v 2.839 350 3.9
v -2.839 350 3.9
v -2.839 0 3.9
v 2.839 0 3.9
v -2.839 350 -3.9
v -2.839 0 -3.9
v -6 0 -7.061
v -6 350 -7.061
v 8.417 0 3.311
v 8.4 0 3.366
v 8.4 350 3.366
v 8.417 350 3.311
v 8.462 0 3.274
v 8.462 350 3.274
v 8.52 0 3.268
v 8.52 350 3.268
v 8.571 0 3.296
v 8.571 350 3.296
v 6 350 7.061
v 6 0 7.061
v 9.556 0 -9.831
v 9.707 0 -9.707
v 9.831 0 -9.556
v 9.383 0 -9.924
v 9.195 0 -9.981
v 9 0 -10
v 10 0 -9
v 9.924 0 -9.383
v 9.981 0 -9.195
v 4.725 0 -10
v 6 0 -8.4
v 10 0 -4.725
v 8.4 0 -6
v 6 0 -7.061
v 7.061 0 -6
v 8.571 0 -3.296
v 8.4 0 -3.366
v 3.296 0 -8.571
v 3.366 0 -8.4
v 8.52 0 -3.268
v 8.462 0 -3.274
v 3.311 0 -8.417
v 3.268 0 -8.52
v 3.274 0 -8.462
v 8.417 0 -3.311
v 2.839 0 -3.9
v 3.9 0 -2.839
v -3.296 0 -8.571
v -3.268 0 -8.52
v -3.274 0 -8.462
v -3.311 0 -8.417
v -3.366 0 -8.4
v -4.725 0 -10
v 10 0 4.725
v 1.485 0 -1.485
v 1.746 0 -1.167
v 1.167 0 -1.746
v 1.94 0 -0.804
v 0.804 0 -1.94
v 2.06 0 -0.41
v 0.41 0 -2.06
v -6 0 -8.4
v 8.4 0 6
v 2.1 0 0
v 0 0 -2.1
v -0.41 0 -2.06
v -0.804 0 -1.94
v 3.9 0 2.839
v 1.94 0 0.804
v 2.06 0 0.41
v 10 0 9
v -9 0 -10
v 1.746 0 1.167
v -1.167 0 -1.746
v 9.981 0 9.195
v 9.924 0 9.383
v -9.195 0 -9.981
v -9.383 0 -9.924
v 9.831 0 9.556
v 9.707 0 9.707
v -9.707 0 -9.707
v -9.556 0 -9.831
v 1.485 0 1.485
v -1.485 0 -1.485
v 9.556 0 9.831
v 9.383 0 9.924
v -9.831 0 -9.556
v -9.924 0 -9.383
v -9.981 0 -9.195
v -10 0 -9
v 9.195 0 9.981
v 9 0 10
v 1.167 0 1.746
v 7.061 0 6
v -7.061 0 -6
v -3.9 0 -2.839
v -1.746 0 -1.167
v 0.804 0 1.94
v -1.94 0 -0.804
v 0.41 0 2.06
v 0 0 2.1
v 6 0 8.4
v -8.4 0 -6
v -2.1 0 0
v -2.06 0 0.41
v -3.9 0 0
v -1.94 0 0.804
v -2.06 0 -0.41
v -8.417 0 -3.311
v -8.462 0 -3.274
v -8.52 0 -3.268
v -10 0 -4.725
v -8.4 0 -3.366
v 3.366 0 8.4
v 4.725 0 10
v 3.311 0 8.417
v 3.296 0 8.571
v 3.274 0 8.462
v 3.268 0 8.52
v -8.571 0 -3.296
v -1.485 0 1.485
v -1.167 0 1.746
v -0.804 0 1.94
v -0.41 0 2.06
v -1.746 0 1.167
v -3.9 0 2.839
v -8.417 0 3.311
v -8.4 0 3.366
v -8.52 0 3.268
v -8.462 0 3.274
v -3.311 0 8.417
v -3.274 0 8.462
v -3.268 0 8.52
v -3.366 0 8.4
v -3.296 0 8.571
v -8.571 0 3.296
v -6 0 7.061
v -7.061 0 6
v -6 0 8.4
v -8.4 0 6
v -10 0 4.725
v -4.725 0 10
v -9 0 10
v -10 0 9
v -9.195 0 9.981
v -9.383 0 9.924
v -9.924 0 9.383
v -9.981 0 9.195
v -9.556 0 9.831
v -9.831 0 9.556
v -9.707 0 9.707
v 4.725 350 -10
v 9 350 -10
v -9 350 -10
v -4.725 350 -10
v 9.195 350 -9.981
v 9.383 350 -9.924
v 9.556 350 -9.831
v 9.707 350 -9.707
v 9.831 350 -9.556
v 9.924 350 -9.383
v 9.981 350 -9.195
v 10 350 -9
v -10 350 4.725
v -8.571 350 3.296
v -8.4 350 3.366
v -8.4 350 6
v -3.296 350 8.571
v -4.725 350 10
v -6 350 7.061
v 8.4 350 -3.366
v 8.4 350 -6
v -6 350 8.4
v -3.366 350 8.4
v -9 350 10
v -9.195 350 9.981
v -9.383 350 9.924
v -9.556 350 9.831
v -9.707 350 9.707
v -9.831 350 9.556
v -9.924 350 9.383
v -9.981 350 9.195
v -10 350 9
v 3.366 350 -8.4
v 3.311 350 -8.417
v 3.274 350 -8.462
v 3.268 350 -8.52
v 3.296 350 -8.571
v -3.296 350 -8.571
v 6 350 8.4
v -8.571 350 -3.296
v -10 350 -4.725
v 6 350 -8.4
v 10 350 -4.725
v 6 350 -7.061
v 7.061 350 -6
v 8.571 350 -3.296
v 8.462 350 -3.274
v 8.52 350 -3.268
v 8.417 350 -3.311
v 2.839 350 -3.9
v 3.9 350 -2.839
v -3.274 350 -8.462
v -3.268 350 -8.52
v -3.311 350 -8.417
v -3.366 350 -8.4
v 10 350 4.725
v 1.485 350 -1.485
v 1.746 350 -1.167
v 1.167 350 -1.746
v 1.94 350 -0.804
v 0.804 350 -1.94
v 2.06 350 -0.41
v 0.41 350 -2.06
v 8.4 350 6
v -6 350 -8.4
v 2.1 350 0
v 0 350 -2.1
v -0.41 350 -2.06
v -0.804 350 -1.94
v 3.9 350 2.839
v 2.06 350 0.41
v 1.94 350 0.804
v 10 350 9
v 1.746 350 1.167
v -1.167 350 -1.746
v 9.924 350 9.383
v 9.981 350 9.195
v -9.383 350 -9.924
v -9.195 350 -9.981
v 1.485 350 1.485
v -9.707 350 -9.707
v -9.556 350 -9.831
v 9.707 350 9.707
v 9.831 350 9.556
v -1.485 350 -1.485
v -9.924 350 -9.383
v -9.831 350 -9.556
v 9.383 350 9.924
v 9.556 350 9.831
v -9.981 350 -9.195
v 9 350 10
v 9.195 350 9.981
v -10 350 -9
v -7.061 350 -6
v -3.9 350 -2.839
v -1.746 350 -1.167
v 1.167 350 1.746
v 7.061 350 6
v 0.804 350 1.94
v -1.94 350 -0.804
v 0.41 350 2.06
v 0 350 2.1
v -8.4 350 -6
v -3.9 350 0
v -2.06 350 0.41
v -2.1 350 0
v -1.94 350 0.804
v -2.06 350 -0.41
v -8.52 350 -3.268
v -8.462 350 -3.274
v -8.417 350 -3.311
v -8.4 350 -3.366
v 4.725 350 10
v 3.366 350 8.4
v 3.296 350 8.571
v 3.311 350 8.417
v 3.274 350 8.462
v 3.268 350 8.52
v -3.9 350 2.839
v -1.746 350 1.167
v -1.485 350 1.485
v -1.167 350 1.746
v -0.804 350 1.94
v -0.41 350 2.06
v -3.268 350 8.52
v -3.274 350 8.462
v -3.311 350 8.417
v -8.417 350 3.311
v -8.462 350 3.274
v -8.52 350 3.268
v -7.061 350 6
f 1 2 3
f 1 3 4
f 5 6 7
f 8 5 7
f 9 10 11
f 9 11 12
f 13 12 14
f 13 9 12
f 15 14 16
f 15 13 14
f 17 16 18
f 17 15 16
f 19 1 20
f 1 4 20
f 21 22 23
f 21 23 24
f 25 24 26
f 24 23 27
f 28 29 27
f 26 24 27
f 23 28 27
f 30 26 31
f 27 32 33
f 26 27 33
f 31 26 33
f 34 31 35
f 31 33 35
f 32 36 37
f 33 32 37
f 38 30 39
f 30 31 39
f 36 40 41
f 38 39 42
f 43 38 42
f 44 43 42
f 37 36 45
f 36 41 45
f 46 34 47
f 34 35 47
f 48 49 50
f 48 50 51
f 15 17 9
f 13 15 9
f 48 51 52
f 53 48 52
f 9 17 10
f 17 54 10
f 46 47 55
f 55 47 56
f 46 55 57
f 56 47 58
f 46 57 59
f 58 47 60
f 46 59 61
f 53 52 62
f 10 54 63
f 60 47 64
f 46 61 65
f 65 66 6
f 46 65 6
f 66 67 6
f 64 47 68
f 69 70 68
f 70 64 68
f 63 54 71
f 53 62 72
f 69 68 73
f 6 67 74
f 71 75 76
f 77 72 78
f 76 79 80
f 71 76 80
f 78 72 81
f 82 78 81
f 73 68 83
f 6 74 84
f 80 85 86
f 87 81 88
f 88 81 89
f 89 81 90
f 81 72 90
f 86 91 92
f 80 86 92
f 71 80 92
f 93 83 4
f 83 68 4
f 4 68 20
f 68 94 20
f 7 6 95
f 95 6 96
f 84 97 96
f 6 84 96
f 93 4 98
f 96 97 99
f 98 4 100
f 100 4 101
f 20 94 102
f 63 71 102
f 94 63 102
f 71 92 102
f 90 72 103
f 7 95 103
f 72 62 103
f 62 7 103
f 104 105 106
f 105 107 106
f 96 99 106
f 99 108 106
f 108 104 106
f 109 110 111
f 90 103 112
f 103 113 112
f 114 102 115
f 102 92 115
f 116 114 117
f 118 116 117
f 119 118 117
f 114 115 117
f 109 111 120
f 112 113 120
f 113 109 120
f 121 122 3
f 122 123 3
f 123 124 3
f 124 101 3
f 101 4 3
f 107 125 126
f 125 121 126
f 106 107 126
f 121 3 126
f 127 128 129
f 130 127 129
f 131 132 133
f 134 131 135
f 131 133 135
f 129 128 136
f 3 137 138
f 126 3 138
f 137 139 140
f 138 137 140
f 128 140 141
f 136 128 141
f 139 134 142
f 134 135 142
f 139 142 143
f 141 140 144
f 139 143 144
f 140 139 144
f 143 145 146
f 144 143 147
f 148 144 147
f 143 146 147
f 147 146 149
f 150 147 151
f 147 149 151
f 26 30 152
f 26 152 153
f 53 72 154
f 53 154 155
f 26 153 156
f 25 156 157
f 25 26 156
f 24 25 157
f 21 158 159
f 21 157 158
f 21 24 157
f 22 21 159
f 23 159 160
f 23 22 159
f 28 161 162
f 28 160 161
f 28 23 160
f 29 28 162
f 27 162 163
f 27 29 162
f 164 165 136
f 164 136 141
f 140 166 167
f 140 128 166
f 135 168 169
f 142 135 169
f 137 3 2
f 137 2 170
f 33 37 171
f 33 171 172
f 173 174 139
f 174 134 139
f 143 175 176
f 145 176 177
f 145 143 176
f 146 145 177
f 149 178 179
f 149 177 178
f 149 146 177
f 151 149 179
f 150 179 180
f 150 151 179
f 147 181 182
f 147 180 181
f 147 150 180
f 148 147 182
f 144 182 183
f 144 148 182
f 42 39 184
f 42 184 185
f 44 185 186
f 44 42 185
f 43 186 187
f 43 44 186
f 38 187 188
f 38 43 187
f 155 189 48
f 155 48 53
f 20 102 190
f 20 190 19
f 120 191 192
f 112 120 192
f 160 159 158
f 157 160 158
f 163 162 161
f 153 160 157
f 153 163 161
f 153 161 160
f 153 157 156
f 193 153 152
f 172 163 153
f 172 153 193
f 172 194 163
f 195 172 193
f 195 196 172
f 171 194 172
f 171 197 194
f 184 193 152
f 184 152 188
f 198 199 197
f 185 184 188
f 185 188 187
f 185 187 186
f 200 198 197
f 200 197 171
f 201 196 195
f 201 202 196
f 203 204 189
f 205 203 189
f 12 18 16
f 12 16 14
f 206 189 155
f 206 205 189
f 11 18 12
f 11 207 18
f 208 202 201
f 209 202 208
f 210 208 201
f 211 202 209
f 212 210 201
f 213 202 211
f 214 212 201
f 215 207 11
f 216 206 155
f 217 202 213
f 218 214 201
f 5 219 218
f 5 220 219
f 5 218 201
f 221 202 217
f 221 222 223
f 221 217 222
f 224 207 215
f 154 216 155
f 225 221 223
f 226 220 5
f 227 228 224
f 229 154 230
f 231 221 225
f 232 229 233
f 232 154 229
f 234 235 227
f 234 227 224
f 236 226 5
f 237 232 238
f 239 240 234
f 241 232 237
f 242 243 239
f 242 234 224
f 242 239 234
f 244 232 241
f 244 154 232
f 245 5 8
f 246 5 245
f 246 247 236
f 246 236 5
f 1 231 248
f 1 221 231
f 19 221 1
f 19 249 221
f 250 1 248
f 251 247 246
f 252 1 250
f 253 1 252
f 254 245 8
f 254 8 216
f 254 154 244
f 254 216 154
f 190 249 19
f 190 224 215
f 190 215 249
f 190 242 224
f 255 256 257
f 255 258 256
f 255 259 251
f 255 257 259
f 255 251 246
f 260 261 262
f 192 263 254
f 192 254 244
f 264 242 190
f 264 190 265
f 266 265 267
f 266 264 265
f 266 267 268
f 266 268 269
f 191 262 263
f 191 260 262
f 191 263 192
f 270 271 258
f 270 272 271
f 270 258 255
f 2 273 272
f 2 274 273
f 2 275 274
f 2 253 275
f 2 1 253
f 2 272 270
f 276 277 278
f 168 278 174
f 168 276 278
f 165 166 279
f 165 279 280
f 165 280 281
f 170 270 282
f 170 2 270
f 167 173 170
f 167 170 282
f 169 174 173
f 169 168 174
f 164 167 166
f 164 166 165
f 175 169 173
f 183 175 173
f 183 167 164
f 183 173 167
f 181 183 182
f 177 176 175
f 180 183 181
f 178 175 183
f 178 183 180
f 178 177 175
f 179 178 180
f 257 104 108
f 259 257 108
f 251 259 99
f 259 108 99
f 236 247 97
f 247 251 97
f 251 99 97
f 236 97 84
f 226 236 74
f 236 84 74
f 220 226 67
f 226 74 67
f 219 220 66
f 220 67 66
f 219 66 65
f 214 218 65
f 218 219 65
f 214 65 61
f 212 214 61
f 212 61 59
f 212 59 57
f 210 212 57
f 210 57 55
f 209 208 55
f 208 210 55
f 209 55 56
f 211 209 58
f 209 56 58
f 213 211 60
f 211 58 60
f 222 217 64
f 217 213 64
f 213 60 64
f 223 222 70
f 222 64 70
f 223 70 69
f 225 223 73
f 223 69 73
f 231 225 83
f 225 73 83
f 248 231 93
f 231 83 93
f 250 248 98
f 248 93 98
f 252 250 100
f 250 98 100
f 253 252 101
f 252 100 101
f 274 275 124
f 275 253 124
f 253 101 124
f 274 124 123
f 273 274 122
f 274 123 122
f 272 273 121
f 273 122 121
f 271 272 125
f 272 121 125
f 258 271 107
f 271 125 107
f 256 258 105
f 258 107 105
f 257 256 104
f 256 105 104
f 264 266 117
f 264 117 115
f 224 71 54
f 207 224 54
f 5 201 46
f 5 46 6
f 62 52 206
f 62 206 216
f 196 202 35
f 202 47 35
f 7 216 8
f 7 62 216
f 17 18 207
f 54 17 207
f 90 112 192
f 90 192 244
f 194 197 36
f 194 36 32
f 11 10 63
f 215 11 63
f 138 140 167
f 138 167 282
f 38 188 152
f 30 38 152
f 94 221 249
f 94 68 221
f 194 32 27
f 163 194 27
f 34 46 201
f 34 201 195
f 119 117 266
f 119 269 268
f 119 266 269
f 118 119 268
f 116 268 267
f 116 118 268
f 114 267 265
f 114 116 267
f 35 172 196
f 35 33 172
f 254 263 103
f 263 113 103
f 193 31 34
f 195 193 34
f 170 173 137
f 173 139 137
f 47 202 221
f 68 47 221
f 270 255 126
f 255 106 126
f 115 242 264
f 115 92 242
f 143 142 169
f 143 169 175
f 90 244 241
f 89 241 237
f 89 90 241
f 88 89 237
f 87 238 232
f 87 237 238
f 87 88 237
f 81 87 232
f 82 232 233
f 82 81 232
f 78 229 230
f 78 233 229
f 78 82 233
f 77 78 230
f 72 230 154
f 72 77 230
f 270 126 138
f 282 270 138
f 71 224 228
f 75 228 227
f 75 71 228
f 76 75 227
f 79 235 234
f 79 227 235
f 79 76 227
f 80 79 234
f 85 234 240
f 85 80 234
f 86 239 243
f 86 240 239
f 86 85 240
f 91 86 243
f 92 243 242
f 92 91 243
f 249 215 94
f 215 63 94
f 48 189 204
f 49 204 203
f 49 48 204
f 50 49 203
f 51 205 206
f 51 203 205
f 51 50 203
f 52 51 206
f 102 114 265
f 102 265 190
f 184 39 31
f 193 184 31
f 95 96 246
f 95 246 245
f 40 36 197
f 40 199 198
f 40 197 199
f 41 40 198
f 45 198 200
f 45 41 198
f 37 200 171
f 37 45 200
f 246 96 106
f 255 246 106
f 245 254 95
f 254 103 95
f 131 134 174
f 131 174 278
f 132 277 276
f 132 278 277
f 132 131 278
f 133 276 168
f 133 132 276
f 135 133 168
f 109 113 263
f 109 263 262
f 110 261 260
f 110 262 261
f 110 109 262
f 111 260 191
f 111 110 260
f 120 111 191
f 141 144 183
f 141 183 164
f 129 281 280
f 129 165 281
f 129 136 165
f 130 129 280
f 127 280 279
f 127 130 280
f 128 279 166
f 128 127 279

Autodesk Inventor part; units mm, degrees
ref_plane "YZ Plane" through (0, 0, 0) normal (1, 0, 0) x (0, 1, 0)
ref_plane "XZ Plane" through (0, 0, 0) normal (0, 1, 0) x (-1, 0, 0)
ref_plane "XY Plane" through (0, 0, 0) normal (0, 0, 1) x (1, 0, 0)
sketch "Sketch1" plane through (0, 0, 0) normal (0, 1, 0) x (-1, 0, 0)
  line L0 (3.9, -2.8393) -> (3.9, 2.8393)
  line L1 (2.8393, 3.9) -> (-2.8393, 3.9)
  line L2 (-2.8393, -3.9) -> (2.8393, -3.9)
  line L3 (8.5707, 3.2957) -> (10, 4.725)
  line L4 (8.5707, -3.2957) -> (10, -4.725)
  line L5 (8.4, 3.3664) -> (8.4, 6)
  line L6 (8.4, 6) -> (7.0607, 6)
  line L7 (10, 9) -> (10, 4.725)
  line L8 (10, -4.725) -> (10, -9)
  line L9 (3.9, 2.8393) -> (7.0607, 6)
  line L10 (3.2957, 8.5707) -> (4.725, 10)
  line L11 (3.3664, 8.4) -> (6, 8.4)
  line L12 (6, 8.4) -> (6, 7.0607)
  line L13 (2.8393, 3.9) -> (6, 7.0607)
  line L14 (3.9, 0) -> (8.4, 0)
  line L15 (8.4, -3.3664) -> (8.4, -6)
  line L16 (8.4, -6) -> (7.0607, -6)
  line L17 (3.9, -2.8393) -> (7.0607, -6)
  line L18 (3.2957, -8.5707) -> (4.725, -10)
  line L19 (3.3664, -8.4) -> (6, -8.4)
  line L20 (6, -8.4) -> (6, -7.0607)
  line L21 (2.8393, -3.9) -> (6, -7.0607)
  line L22 (-3.9, -2.8393) -> (-3.9, 2.8393)
  line L23 (-8.5707, 3.2957) -> (-10, 4.725)
  line L24 (-8.5707, -3.2957) -> (-10, -4.725)
  line L25 (-8.4, 3.3664) -> (-8.4, 6)
  line L26 (-8.4, 6) -> (-7.0607, 6)
  line L27 (-10, 9) -> (-10, 4.725)
  line L28 (-10, -4.725) -> (-10, -9)
  line L29 (-3.9, 2.8393) -> (-7.0607, 6)
  line L30 (-3.2957, 8.5707) -> (-4.725, 10)
  line L31 (-3.3664, 8.4) -> (-6, 8.4)
  line L32 (-6, 8.4) -> (-6, 7.0607)
  line L33 (-2.8393, 3.9) -> (-6, 7.0607)
  line L34 (-3.9, -2.8393) -> (-7.0607, -6)
  line L35 (-8.4, -6) -> (-7.0607, -6)
  line L36 (-8.4, -3.3664) -> (-8.4, -6)
  line L37 (-2.8393, -3.9) -> (-6, -7.0607)
  line L38 (-6, -8.4) -> (-6, -7.0607)
  line L39 (-3.3664, -8.4) -> (-6, -8.4)
  line L40 (-3.2957, -8.5707) -> (-4.725, -10)
  line L41 (-9, 10) -> (-4.725, 10)
  line L42 (4.725, 10) -> (9, 10)
  line L43 (9, -10) -> (4.725, -10)
  line L44 (-4.725, -10) -> (-9, -10)
  circle A0 centre (0, 0) radius 2.1
  arc A1 (10, 9) -> (9, 10) centre (9, 9) ccw
  arc A2 (9, -10) -> (10, -9) centre (9, -9) ccw
  arc A3 (-10, -9) -> (-9, -10) centre (-9, -9) ccw
  arc A4 (-9, 10) -> (-10, 9) centre (-9, 9) ccw
  arc A5 (8.4, 3.3664) -> (8.5707, 3.2957) centre (8.5, 3.3664) ccw
  arc A6 (3.2957, 8.5707) -> (3.3664, 8.4) centre (3.3664, 8.5) ccw
  arc A7 (8.5707, -3.2957) -> (8.4, -3.3664) centre (8.5, -3.3664) ccw
  arc A8 (3.3664, -8.4) -> (3.2957, -8.5707) centre (3.3664, -8.5) ccw
  arc A9 (-3.2957, -8.5707) -> (-3.3664, -8.4) centre (-3.3664, -8.5) ccw
  arc A10 (-8.4, -3.3664) -> (-8.5707, -3.2957) centre (-8.5, -3.3664) ccw
  arc A11 (-8.5707, 3.2957) -> (-8.4, 3.3664) centre (-8.5, 3.3664) ccw
  arc A12 (-3.3664, 8.4) -> (-3.2957, 8.5707) centre (-3.3664, 8.5) ccw
  dimension "d11" = 1
extrude "Extrusion1" add sketch "Sketch1" along normal blind 350
properties part number "VSLOT20x20x350"
